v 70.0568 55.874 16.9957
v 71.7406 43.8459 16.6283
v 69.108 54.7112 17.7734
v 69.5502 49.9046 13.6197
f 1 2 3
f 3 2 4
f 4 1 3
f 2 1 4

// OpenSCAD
// Auto-generated auxetic polyhedron
points = [
    [69.108009, 54.711208, 17.773387],
    [71.740579, 43.845858, 16.628267],
    [70.056840, 55.873958, 16.995733],
    [69.550186, 49.904566, 13.619740],
];

faces = [
    [0, 1, 2],
    [3, 1, 0],
    [0, 2, 3],
    [3, 2, 1],
];

polyhedron(points = points, faces = faces);
